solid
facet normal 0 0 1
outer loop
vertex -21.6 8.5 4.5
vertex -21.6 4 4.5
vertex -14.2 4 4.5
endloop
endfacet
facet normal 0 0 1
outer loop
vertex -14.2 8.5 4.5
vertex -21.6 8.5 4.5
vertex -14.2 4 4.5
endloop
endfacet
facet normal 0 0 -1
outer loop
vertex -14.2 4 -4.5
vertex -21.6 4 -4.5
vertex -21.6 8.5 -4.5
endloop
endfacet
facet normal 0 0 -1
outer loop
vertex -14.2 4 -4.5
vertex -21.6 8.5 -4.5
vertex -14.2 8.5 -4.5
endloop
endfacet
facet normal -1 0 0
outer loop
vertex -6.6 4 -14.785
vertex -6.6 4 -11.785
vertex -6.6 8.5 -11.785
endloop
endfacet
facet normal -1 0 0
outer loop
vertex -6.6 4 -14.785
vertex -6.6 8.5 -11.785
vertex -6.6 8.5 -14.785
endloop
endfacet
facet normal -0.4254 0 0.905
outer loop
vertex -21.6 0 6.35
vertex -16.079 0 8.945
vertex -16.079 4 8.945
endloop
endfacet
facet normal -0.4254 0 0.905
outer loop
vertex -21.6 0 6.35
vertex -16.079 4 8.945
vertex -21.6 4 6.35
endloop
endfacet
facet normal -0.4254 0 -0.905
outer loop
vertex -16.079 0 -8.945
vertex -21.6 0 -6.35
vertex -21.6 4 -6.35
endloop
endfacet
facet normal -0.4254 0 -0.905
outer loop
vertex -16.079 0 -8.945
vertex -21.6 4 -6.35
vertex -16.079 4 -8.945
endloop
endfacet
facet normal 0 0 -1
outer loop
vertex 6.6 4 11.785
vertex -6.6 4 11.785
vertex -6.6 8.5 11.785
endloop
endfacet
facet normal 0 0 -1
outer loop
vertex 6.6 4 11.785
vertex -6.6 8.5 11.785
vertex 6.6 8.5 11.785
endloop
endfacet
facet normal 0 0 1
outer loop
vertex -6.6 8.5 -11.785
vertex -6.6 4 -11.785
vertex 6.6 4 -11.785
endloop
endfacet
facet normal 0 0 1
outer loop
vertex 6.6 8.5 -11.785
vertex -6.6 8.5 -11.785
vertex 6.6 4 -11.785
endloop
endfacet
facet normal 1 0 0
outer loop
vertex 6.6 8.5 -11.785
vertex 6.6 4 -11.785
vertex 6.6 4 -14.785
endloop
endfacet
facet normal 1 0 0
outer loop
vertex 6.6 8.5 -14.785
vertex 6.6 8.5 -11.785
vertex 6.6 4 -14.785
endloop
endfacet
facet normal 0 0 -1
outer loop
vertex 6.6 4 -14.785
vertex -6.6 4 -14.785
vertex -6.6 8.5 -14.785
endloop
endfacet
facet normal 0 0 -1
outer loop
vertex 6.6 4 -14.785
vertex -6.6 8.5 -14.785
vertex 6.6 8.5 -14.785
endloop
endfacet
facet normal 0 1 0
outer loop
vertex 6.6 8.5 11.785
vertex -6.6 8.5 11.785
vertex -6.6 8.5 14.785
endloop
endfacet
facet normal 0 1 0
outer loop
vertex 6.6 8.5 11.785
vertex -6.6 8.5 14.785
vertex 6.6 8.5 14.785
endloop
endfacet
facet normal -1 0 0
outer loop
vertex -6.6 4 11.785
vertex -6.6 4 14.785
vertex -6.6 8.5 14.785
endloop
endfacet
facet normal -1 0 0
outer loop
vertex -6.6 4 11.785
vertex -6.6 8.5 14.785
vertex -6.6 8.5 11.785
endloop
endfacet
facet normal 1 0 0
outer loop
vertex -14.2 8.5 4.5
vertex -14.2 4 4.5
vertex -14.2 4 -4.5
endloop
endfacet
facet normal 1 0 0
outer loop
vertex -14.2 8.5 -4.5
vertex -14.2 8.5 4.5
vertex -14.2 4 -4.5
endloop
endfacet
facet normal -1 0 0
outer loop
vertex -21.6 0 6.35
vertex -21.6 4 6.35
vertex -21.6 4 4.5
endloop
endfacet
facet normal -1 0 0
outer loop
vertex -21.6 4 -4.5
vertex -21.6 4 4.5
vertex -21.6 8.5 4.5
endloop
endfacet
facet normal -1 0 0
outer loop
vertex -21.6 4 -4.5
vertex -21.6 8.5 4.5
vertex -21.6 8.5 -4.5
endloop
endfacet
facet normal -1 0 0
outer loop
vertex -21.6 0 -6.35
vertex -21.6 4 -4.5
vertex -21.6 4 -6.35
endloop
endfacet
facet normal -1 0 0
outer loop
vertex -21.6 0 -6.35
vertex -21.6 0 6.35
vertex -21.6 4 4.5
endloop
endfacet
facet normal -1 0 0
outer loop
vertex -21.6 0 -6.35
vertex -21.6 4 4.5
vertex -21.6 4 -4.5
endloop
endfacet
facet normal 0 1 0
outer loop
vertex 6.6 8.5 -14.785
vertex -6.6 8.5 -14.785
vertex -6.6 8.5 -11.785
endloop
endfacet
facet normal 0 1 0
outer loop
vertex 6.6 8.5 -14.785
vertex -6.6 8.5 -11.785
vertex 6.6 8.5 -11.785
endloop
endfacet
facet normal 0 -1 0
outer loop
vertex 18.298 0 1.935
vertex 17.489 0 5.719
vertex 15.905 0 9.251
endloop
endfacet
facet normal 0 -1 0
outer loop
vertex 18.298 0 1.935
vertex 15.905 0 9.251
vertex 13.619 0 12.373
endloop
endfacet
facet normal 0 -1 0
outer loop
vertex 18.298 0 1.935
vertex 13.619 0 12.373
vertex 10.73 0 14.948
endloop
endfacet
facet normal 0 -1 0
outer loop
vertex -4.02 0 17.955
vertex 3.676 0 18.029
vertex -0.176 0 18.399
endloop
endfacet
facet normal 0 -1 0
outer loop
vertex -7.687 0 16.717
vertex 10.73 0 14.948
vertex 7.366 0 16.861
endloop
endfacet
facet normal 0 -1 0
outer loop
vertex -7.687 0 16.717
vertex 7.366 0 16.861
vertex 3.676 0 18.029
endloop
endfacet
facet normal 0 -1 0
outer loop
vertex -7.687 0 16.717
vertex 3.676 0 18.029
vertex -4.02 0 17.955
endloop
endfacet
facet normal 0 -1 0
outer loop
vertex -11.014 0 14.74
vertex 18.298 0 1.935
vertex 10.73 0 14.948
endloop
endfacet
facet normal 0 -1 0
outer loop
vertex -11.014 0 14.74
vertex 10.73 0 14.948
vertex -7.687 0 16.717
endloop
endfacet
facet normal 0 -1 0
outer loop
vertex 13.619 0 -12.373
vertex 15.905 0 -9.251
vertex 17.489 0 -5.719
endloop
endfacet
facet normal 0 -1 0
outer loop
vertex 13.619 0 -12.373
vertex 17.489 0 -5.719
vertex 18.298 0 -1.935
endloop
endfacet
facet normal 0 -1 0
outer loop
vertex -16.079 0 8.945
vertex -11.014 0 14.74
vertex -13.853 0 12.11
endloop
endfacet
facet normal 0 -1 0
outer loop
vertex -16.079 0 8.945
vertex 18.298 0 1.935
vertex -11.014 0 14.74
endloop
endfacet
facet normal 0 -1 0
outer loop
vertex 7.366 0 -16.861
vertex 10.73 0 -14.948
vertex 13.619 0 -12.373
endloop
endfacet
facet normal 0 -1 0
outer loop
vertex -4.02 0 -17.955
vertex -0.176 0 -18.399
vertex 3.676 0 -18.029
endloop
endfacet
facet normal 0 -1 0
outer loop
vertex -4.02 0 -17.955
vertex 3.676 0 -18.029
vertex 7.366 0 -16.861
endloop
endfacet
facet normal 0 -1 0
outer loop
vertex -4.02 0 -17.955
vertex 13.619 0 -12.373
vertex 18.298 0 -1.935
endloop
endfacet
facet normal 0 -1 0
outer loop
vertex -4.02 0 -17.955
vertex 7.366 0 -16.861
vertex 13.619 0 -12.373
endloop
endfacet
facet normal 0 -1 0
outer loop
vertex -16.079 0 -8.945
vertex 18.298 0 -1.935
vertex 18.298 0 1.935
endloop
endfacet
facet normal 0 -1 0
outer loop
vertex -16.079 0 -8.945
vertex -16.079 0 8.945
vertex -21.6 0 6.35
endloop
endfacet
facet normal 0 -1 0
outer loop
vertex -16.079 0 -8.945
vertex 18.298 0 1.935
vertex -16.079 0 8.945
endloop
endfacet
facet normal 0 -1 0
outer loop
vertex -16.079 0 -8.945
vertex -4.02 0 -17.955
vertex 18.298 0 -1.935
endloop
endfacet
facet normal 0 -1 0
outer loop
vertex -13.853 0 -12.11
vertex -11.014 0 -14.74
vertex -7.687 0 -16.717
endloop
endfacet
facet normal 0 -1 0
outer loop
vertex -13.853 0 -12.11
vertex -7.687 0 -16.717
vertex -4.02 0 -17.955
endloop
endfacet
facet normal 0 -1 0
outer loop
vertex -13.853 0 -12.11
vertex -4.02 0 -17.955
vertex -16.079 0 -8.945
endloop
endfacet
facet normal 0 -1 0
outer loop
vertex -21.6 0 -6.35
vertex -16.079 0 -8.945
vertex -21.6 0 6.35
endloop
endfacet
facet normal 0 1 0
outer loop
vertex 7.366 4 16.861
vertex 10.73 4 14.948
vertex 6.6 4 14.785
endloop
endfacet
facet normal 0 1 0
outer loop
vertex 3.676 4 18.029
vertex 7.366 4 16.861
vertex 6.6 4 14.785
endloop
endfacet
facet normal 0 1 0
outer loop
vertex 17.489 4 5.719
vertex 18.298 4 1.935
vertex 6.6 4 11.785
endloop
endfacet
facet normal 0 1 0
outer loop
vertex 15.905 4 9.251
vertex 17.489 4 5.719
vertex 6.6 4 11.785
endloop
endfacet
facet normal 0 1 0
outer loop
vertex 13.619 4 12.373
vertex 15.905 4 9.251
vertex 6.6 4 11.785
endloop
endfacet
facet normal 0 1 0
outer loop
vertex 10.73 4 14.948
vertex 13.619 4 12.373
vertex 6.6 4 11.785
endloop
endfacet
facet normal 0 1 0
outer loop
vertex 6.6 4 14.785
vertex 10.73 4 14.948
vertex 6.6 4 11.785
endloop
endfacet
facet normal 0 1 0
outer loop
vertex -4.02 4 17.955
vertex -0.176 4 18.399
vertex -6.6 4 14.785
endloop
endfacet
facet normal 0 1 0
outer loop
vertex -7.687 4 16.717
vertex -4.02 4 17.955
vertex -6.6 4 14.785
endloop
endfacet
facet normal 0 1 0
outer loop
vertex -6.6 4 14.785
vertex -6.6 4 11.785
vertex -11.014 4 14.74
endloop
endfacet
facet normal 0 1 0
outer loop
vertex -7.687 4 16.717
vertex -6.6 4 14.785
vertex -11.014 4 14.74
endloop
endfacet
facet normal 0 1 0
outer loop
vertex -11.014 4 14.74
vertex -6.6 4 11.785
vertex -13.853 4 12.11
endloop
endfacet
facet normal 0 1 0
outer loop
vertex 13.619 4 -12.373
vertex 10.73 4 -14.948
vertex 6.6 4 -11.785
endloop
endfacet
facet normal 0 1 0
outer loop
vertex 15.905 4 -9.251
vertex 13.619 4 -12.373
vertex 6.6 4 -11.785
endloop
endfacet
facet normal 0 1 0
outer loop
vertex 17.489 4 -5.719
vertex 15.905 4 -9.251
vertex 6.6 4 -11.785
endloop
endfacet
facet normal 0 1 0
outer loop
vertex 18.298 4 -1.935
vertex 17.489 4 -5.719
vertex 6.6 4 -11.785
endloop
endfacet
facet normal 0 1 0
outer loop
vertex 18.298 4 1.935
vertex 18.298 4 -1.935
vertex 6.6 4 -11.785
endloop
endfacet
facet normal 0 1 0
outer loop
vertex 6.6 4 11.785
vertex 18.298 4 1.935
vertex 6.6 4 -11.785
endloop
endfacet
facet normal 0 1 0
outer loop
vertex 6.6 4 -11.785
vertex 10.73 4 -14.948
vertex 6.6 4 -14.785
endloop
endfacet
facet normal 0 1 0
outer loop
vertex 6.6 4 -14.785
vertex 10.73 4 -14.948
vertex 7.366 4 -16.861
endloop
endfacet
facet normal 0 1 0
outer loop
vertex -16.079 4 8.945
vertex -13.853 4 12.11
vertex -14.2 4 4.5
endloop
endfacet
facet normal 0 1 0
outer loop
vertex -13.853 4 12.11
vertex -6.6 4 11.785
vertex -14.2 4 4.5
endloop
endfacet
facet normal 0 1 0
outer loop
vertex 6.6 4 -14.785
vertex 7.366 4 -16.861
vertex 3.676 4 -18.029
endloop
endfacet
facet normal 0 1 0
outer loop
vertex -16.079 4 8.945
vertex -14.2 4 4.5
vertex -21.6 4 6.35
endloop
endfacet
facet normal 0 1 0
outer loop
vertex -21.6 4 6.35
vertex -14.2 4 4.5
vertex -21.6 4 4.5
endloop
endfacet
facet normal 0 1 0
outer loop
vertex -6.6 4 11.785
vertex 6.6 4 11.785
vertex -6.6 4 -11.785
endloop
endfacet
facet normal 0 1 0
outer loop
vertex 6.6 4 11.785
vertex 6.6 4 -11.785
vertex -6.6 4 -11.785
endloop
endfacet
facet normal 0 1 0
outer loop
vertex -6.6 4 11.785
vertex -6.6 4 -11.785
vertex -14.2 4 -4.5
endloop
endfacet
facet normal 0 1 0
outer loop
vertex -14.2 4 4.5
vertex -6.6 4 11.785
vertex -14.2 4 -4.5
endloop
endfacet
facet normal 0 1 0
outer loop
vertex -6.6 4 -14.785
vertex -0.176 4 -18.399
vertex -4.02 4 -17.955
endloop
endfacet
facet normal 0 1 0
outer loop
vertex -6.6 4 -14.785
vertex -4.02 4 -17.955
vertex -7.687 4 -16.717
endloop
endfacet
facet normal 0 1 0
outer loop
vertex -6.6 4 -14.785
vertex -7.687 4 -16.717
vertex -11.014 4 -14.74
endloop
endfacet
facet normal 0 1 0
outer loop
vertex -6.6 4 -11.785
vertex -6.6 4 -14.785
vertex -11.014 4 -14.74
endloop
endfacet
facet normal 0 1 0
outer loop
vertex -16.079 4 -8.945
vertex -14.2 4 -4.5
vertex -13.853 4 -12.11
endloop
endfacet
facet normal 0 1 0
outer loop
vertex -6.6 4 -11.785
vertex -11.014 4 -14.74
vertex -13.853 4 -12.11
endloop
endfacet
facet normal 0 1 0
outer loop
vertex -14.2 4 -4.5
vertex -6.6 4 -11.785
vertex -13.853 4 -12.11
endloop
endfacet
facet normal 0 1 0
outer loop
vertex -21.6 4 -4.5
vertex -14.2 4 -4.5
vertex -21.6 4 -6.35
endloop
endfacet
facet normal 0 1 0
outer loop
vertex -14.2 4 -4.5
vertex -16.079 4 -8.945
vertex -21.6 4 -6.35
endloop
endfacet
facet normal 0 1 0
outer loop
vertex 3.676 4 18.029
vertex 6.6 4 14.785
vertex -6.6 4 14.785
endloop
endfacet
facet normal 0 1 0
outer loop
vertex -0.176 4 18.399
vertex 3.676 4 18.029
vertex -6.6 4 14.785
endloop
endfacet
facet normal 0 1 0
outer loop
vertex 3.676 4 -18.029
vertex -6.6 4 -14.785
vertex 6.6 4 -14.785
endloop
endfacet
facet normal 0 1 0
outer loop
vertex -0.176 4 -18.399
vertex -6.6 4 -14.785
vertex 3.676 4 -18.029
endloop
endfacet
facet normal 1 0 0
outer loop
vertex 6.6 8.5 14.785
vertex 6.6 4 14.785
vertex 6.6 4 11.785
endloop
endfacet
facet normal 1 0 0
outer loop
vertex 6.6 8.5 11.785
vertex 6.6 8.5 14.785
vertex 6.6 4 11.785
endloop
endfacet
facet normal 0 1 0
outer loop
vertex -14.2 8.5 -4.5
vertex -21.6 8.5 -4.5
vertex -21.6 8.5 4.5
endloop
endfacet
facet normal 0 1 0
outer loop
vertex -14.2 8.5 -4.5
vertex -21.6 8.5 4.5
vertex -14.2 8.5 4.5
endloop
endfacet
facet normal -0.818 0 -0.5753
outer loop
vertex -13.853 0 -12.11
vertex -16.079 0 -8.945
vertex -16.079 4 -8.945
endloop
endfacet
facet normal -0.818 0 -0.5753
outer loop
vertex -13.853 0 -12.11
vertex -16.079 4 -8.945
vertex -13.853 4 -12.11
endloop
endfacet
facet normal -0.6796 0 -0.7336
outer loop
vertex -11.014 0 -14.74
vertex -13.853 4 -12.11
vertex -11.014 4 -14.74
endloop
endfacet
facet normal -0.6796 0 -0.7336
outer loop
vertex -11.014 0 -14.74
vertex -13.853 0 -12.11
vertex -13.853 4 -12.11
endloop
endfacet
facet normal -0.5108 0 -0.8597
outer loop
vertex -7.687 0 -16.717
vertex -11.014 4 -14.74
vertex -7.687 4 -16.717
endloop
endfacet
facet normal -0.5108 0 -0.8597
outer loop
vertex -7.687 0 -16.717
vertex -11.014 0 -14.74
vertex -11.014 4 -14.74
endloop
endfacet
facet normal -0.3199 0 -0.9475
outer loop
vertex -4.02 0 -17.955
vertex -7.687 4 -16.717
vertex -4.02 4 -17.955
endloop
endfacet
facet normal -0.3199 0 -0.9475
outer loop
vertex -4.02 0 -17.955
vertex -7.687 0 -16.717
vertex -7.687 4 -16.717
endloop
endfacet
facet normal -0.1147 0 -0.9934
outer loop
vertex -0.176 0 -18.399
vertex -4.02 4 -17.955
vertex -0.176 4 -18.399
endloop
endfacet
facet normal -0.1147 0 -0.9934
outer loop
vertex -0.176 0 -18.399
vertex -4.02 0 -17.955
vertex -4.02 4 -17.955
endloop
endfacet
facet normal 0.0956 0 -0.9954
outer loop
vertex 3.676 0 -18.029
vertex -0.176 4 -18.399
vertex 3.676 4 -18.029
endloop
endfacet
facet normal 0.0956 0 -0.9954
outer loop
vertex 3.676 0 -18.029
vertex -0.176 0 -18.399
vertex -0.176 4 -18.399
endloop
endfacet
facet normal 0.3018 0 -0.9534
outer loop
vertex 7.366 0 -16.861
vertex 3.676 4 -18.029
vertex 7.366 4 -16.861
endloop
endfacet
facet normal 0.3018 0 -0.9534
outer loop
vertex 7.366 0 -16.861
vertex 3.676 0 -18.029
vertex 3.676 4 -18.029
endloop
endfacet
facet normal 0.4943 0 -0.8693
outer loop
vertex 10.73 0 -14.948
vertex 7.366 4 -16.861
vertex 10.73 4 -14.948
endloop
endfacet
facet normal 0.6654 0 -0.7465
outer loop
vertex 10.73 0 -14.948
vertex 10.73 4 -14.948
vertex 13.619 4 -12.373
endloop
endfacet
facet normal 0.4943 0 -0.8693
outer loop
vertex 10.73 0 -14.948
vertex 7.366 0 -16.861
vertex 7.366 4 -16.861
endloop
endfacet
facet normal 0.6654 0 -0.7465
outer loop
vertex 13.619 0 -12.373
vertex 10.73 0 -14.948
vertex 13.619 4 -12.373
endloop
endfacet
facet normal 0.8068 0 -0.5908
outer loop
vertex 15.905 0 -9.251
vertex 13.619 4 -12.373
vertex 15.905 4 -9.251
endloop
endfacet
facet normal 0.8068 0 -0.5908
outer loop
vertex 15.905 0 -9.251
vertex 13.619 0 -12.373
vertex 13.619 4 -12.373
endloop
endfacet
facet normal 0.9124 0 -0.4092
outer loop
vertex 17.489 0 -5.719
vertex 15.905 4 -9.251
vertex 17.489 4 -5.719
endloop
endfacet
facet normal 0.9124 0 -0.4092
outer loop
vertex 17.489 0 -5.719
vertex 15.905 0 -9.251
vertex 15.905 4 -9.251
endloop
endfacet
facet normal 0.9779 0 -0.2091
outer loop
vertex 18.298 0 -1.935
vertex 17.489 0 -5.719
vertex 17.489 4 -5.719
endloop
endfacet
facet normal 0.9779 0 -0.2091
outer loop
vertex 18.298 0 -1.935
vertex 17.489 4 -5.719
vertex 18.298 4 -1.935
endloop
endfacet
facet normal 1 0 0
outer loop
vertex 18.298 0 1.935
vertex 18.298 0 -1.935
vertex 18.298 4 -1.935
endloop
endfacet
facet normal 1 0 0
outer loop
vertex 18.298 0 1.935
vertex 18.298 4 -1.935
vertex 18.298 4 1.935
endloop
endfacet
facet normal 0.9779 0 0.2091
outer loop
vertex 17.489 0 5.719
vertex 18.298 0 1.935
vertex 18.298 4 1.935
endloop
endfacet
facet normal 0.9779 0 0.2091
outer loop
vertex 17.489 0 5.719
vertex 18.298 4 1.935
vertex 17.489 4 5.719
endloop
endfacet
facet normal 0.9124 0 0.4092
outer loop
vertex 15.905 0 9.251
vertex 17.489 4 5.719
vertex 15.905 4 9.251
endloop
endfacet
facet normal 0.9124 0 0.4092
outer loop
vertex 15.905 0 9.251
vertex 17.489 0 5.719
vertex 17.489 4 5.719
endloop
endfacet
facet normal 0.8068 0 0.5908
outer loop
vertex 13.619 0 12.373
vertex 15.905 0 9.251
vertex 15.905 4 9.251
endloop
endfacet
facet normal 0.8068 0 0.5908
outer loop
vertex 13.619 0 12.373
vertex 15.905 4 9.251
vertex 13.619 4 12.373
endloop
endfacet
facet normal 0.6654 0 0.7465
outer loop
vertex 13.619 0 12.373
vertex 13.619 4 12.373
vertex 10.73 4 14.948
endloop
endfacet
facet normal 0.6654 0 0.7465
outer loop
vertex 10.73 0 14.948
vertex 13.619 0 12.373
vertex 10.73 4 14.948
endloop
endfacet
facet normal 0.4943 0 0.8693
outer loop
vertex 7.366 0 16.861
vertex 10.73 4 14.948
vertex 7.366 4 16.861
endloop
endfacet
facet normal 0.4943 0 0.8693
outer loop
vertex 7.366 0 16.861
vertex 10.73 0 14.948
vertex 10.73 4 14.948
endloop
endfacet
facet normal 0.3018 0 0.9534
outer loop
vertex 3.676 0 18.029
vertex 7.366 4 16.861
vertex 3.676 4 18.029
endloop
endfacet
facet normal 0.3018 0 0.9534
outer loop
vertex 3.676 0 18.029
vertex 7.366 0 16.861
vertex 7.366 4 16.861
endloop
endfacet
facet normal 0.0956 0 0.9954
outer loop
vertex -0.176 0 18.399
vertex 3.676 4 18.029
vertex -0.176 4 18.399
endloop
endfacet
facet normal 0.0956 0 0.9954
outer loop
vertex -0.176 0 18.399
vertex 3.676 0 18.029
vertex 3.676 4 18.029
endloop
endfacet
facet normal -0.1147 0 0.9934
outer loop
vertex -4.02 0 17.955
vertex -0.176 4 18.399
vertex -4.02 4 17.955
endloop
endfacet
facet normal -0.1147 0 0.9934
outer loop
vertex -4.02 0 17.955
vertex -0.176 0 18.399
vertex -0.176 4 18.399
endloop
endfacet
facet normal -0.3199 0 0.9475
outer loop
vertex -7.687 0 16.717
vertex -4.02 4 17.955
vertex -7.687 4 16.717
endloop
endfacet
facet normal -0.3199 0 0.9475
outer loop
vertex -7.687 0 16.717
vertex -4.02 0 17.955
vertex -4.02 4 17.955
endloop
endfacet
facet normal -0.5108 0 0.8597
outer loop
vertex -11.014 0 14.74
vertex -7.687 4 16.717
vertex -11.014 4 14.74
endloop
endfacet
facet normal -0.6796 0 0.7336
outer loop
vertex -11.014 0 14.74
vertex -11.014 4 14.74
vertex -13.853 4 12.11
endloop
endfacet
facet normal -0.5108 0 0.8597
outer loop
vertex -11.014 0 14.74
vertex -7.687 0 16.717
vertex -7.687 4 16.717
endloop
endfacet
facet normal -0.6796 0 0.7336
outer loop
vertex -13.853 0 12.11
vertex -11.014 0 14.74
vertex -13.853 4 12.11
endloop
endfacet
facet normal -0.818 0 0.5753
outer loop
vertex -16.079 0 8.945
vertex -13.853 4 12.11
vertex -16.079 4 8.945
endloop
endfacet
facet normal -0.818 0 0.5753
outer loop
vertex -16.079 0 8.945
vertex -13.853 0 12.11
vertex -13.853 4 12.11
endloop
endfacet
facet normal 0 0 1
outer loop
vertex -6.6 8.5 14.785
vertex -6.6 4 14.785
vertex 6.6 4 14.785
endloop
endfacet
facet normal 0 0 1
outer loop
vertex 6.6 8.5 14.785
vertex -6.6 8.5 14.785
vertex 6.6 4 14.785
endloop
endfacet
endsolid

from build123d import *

# Parameters (mm, degrees)
BOSS_EXTRUDE1_DEPTH = 4
SKETCH2_W           = 13.2
SKETCH2_H           = 3
SKETCH2_W_2         = 7.4
SKETCH2_H_2         = 9
BOSS_EXTRUDE2_DEPTH = 4.5


with BuildPart() as part:
    # Sketch1 → Boss-Extrude1 (new body)
    with BuildSketch(Plane(origin=(0, 0, 0), x_dir=(1, 0, 0), z_dir=(0, 1, 0))):
        with BuildLine():
            Line((-21.6, -6.35), (-21.6, 6.35))
            Line((-21.6, 6.35), (-16.079449671, 8.94490348))
            ThreePointArc((-16.079449671, 8.94490348), (18.4, 0), (-16.079449671, -8.94490348))
            Line((-16.079449671, -8.94490348), (-21.6, -6.35))
        make_face()
    extrude(amount=BOSS_EXTRUDE1_DEPTH)

    # Sketch2 → Boss-Extrude2 (add)
    with BuildSketch(Plane(origin=(0, 4, 0), x_dir=(1, 0, 0), z_dir=(0, 1, 0))):
        with Locations((0, 13.285)):
            Rectangle(SKETCH2_W, SKETCH2_H)
        with Locations((0, -13.285)):
            Rectangle(SKETCH2_W, SKETCH2_H)
        with Locations((-17.9, 0)):
            Rectangle(SKETCH2_W_2, SKETCH2_H_2)
    extrude(amount=BOSS_EXTRUDE2_DEPTH)


solid = part.part
